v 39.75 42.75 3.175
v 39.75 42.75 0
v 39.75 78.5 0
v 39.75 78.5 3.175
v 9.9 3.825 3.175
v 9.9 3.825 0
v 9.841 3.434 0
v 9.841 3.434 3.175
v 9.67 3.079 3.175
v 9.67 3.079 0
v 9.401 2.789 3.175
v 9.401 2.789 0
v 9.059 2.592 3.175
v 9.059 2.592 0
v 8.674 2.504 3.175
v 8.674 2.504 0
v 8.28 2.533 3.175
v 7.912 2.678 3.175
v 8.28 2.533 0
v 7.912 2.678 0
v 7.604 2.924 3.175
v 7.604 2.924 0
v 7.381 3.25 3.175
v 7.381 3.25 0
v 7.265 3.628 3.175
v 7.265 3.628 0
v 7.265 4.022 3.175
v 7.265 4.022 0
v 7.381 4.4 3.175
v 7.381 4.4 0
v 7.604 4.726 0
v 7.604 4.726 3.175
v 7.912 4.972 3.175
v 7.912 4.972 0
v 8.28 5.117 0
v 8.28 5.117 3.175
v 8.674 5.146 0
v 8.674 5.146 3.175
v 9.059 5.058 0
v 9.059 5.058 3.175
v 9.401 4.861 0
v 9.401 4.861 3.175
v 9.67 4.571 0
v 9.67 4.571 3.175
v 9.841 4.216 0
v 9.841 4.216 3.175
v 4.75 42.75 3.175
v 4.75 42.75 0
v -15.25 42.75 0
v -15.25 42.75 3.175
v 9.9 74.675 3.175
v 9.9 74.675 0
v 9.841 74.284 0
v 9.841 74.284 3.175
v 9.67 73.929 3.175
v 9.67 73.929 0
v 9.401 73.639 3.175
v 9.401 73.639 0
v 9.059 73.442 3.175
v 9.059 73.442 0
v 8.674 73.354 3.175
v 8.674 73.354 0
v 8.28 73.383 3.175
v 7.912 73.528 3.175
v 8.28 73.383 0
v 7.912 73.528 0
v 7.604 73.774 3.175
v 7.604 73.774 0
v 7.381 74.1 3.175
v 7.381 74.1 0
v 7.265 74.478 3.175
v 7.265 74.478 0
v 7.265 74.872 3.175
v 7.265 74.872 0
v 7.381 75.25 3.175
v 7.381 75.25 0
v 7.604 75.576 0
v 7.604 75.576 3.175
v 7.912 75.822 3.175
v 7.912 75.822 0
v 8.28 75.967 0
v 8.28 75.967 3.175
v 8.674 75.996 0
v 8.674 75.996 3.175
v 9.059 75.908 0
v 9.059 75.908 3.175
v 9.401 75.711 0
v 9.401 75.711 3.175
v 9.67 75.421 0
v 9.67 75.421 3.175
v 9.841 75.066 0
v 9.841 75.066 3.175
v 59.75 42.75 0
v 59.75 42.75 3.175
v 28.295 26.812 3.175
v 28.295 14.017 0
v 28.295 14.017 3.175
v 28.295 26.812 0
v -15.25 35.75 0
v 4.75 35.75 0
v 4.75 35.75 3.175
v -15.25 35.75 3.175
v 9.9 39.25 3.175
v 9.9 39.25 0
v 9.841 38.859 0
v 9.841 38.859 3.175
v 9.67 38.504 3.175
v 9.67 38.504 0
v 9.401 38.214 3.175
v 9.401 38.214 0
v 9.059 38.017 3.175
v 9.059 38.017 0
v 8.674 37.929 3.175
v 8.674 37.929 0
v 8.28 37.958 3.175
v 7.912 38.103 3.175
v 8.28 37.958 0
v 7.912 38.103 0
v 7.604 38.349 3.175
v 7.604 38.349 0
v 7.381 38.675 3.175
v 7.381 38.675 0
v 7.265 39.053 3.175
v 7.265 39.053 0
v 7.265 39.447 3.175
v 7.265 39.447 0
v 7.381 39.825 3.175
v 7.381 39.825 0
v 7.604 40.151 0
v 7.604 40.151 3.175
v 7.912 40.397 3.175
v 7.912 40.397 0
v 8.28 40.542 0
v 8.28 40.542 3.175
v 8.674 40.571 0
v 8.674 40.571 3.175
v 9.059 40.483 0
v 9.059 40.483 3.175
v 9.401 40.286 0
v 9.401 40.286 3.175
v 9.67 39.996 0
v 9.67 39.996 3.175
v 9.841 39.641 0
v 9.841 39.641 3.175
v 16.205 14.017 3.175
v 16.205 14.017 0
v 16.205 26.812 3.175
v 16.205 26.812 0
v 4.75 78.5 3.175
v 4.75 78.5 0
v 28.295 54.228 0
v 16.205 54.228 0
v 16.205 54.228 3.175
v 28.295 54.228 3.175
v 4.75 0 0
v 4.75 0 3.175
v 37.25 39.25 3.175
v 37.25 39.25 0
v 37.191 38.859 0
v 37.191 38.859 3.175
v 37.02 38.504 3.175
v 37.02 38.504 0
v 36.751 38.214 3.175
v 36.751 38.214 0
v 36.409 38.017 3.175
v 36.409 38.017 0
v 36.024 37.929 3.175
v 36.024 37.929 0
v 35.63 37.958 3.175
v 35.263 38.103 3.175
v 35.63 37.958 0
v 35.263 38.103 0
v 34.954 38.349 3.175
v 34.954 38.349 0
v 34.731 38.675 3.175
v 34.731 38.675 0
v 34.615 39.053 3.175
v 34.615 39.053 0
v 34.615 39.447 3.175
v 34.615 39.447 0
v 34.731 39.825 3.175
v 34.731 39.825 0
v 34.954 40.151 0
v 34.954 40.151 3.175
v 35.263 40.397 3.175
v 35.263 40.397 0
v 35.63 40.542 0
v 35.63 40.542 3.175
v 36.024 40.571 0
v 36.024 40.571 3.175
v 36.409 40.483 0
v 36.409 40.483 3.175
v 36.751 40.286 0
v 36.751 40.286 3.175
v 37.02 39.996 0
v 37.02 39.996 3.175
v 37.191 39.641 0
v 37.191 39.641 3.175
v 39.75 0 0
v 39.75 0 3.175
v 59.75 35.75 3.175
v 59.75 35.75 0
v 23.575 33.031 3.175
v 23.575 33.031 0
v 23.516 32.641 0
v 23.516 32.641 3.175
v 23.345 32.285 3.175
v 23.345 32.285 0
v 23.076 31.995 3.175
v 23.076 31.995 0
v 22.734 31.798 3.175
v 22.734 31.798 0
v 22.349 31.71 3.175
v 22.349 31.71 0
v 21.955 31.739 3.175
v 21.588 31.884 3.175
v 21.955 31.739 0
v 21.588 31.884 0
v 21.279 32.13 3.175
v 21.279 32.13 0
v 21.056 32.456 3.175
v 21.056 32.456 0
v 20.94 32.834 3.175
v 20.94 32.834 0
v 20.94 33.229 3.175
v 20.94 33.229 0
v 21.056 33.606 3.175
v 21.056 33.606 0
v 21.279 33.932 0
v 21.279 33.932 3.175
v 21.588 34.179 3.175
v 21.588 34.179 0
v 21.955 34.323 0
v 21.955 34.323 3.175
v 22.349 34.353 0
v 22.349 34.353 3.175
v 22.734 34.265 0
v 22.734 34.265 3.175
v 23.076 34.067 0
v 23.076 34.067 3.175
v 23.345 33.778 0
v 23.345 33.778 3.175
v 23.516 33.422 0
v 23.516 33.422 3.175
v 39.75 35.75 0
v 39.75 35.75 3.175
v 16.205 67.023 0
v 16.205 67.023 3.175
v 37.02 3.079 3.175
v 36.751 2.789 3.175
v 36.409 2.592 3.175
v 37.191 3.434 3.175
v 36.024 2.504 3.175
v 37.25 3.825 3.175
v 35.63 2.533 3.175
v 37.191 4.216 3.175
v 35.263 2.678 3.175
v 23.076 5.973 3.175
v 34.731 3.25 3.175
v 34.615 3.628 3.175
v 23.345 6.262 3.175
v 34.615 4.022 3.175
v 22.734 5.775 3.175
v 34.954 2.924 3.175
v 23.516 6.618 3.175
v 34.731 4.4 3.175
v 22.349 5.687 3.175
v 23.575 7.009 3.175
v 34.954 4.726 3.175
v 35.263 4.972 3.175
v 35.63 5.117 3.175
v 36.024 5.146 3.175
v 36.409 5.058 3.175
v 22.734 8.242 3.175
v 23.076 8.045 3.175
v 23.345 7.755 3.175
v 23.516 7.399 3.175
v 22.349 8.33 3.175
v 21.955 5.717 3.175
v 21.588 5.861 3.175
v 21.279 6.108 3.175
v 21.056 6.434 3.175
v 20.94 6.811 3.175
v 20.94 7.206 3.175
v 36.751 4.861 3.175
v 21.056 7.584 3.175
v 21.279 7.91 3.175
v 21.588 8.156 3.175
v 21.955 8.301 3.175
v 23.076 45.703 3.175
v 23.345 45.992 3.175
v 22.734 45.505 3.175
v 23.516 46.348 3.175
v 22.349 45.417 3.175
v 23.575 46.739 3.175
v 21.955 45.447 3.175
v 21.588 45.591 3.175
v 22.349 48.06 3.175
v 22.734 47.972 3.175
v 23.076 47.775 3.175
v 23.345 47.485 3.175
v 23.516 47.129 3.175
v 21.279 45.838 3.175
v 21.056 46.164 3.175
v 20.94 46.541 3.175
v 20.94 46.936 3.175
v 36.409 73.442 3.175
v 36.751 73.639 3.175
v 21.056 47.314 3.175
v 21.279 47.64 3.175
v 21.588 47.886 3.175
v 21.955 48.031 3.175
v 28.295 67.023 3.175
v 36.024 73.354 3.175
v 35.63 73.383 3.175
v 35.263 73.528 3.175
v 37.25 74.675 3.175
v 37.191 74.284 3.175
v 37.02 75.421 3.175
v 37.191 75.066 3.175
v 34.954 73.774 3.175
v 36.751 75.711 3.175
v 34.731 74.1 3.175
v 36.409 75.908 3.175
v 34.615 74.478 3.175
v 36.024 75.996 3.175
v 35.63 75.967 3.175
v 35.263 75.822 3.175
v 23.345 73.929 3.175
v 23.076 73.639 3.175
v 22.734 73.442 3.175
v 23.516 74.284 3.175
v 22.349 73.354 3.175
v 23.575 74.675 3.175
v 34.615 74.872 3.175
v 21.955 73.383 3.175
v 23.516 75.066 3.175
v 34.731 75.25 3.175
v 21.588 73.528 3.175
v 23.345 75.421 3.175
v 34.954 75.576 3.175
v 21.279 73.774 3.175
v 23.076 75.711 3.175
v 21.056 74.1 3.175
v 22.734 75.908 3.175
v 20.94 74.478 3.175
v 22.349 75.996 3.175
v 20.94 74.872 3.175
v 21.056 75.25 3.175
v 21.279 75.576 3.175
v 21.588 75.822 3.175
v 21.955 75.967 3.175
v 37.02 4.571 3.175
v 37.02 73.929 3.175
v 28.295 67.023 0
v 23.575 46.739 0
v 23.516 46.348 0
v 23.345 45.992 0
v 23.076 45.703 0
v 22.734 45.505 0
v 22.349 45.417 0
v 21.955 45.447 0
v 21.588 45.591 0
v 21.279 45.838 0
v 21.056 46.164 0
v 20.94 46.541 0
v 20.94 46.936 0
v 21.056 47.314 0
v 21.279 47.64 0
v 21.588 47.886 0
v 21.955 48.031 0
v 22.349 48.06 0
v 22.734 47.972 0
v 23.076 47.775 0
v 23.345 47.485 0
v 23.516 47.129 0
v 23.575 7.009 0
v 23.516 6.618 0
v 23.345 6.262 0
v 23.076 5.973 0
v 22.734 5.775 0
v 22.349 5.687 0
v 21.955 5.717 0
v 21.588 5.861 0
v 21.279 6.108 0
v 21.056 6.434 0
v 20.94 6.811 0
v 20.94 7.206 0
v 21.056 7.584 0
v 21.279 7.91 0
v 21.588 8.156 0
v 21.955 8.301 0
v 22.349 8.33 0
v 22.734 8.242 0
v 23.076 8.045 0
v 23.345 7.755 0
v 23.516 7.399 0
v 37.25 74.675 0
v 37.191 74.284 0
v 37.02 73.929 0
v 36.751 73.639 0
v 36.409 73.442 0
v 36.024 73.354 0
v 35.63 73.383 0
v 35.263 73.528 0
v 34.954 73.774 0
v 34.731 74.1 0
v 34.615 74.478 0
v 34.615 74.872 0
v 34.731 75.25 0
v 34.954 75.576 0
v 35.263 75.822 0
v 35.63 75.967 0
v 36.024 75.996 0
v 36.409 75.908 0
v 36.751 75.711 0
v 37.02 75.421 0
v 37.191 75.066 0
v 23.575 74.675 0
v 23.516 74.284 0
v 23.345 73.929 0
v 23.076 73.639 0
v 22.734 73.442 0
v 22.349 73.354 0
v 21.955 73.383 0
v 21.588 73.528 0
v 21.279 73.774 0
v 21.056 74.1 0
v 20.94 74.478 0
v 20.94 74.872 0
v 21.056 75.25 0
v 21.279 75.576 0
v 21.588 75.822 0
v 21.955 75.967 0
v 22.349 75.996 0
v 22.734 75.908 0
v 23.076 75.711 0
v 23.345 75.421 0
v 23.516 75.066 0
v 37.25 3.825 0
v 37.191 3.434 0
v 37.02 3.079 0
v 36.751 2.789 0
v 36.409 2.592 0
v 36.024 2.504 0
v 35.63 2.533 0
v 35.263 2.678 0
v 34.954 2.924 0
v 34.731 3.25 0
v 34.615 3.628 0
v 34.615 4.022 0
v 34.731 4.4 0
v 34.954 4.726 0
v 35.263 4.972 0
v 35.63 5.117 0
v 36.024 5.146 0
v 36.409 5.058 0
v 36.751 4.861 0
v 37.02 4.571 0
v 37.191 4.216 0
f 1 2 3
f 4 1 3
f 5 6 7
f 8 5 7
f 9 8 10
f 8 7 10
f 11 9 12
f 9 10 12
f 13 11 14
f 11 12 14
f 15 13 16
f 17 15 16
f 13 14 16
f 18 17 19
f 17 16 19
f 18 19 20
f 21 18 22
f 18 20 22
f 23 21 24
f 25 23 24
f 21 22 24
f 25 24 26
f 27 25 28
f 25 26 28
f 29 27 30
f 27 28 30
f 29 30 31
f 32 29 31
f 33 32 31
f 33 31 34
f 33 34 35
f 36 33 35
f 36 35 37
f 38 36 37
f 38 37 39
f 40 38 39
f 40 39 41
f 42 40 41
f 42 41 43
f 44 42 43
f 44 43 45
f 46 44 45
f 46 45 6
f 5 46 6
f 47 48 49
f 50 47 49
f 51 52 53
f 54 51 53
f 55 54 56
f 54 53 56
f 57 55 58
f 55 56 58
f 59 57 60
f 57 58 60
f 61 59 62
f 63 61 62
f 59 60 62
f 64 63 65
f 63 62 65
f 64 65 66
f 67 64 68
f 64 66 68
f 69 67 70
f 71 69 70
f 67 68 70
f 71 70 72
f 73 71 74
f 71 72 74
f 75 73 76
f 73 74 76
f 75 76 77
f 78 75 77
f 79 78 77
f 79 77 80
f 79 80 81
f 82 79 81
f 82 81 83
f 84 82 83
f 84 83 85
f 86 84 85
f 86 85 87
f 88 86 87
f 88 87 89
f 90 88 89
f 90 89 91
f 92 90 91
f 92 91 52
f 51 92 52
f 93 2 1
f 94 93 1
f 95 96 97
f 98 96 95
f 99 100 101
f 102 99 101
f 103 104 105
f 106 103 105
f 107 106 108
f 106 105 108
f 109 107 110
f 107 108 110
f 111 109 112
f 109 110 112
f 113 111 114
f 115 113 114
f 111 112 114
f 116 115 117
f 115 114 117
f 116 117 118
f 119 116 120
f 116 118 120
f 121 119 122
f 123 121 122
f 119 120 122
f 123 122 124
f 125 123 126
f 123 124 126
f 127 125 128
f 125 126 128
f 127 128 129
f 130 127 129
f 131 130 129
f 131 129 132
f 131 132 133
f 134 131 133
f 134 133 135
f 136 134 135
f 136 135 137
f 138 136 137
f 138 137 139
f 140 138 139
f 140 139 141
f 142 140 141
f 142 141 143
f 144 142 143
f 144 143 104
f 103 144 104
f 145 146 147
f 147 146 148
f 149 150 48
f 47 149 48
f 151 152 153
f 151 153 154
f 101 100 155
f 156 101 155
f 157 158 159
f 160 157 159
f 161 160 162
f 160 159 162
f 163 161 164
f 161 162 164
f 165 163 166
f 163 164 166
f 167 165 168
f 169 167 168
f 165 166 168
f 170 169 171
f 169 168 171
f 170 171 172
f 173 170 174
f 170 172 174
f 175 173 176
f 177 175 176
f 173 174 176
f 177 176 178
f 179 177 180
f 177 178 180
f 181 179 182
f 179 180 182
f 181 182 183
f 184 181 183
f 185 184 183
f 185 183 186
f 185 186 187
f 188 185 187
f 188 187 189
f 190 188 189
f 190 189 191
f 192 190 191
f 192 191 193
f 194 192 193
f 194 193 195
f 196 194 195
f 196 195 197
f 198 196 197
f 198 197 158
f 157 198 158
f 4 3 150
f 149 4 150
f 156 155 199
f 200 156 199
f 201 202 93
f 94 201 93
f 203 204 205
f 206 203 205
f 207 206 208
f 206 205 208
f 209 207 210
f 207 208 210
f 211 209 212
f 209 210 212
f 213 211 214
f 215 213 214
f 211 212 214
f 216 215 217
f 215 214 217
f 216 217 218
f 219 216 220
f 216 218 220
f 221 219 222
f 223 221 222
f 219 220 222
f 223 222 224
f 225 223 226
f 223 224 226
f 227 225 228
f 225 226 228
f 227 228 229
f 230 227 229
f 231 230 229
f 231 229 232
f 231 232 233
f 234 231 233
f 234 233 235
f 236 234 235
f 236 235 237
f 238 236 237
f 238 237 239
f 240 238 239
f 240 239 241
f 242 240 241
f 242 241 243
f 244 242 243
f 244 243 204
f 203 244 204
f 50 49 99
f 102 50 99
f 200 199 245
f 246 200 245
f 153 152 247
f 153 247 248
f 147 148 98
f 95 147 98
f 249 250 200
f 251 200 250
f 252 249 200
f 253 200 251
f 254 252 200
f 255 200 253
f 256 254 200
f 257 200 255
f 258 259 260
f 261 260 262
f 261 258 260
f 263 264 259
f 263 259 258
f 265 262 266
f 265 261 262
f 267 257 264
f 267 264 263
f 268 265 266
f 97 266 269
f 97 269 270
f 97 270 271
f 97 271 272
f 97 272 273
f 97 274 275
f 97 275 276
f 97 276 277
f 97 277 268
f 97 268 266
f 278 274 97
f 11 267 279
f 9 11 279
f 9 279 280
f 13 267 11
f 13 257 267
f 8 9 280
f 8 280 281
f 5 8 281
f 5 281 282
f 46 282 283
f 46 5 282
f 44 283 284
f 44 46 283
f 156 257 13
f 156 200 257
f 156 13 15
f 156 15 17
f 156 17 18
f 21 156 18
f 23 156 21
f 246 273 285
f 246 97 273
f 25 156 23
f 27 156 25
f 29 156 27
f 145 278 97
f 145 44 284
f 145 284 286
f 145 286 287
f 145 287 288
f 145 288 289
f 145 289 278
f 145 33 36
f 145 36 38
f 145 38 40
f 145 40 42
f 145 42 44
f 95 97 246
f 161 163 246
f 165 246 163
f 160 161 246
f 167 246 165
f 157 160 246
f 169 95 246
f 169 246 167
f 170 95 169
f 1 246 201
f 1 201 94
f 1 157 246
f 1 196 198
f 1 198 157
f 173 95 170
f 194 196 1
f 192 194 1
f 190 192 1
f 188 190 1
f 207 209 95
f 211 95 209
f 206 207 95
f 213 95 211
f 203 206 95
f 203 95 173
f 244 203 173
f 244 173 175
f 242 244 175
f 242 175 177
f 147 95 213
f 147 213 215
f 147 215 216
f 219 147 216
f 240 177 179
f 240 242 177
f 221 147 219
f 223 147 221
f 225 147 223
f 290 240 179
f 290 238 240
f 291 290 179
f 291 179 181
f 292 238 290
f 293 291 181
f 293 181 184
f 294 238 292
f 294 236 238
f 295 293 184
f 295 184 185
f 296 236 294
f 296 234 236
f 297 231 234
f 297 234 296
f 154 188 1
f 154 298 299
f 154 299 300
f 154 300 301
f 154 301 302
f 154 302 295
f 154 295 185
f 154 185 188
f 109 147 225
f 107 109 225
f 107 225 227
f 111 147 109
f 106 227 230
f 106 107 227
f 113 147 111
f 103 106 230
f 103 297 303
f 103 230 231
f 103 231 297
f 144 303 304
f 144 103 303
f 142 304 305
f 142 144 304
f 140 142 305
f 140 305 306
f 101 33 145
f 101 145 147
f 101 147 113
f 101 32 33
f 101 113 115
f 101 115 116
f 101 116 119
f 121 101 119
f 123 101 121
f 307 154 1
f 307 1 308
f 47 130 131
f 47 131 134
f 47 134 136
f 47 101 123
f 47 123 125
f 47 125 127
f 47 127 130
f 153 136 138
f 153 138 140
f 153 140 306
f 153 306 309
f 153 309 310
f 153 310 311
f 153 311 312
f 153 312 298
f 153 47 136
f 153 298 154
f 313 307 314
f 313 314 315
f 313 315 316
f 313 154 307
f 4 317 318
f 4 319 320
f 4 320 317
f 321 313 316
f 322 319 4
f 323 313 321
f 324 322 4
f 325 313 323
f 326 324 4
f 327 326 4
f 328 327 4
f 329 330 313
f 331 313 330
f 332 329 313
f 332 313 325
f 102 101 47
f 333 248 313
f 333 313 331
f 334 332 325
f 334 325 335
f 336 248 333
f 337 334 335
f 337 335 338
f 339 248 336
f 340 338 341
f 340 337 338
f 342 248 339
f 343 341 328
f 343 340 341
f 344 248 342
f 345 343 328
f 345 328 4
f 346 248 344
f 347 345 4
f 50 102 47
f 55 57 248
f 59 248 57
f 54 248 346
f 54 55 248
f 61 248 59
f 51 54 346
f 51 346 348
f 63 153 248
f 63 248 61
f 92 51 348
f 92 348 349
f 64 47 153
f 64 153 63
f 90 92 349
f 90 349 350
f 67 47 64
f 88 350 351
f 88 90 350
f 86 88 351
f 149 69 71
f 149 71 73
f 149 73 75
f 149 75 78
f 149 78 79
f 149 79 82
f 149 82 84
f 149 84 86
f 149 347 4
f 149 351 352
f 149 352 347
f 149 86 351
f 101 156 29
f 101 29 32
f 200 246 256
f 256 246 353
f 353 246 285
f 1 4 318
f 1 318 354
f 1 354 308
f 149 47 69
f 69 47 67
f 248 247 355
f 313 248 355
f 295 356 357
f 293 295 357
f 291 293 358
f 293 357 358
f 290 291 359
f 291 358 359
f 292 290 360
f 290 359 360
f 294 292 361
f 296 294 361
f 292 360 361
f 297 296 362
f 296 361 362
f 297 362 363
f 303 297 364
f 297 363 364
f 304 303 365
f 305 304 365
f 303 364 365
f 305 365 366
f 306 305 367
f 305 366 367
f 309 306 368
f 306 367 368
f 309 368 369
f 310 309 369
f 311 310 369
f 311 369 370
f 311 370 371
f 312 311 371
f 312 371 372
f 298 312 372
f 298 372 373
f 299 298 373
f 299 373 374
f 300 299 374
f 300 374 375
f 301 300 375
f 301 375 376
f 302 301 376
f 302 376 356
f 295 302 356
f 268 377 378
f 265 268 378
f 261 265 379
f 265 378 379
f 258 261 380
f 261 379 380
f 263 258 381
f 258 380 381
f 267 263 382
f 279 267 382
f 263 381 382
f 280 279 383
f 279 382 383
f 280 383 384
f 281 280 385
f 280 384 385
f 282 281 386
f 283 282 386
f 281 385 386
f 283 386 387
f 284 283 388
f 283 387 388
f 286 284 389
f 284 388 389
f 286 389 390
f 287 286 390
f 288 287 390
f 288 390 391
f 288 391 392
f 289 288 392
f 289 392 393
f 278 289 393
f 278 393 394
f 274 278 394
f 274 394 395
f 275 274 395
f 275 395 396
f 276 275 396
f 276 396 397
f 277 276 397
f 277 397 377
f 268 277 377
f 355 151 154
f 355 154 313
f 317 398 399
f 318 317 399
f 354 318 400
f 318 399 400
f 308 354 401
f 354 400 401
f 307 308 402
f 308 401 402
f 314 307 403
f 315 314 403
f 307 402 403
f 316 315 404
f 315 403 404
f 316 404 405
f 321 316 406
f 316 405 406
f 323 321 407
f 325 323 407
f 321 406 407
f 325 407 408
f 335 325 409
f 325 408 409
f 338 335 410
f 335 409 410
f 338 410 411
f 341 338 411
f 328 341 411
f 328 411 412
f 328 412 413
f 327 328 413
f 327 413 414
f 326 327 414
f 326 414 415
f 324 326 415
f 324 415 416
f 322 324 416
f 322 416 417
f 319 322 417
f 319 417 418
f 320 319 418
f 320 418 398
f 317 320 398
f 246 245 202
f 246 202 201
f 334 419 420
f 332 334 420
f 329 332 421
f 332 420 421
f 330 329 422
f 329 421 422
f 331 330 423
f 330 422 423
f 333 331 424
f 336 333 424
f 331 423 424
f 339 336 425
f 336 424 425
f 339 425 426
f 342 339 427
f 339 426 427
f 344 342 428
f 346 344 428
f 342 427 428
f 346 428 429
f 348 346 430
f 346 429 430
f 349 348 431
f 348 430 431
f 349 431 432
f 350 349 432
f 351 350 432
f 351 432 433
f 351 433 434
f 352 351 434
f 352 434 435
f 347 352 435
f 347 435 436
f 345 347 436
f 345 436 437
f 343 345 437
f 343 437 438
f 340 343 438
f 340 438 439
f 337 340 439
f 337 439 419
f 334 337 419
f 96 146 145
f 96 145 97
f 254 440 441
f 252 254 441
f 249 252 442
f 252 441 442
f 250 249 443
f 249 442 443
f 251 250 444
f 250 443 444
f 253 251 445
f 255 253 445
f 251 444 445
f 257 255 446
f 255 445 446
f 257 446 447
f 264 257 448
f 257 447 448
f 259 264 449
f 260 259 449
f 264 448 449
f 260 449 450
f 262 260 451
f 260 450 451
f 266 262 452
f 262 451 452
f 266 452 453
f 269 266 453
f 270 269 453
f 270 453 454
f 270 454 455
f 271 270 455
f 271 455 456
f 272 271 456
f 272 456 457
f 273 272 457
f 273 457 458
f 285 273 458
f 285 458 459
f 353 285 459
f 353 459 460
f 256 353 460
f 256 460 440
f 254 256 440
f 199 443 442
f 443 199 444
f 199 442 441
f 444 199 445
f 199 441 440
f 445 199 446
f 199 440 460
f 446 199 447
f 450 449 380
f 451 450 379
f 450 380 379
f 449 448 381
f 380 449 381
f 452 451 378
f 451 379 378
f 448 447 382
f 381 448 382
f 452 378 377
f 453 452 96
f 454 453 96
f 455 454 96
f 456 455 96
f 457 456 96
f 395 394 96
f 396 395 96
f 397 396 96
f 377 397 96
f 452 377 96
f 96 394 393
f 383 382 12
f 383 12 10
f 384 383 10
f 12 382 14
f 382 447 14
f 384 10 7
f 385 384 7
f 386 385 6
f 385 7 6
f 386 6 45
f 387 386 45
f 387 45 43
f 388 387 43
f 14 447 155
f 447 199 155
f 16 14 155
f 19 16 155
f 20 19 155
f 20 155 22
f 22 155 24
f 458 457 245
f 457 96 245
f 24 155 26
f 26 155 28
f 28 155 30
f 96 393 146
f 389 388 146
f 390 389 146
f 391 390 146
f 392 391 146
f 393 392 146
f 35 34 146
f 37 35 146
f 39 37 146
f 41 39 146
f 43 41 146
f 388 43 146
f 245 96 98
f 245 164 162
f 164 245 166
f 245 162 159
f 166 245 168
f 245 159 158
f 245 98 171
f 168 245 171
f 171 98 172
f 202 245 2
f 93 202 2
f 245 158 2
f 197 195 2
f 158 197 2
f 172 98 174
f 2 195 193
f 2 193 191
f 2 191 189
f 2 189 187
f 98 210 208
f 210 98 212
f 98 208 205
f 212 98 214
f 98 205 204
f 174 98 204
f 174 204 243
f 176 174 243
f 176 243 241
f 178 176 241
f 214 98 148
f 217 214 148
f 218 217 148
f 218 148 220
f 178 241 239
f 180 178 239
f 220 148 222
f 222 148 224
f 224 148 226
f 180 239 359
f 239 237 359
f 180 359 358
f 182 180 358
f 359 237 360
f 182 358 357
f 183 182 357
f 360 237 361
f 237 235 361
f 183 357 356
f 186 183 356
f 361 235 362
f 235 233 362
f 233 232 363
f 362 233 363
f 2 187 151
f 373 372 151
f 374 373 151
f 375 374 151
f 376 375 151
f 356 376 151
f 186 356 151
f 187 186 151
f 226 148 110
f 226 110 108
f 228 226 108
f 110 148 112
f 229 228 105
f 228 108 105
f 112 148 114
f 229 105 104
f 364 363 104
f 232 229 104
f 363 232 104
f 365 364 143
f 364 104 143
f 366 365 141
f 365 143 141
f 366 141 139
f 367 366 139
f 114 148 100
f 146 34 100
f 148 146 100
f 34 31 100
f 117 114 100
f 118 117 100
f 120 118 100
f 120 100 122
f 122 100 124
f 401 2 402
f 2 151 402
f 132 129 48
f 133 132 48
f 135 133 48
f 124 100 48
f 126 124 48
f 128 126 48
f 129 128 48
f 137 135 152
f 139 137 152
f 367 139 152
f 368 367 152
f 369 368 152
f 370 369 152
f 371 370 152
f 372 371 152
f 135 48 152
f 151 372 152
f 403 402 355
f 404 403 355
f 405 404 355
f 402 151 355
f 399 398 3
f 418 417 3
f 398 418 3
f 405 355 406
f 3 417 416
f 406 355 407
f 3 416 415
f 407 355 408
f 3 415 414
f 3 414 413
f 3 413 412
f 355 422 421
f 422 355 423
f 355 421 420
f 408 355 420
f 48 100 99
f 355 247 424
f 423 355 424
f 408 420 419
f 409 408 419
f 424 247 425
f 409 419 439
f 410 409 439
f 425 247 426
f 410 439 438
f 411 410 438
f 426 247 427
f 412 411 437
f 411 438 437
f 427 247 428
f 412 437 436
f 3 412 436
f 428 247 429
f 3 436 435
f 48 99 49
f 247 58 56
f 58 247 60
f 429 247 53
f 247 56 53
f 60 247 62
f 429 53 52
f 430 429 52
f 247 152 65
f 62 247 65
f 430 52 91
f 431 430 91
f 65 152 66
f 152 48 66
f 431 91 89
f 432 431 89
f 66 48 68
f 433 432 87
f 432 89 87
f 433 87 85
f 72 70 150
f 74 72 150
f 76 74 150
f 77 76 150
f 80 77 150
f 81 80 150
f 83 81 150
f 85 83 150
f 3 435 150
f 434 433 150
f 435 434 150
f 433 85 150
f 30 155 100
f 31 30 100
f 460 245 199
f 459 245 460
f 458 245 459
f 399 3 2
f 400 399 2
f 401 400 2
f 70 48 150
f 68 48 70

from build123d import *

# Parameters (mm, degrees)
F0_W      = 22.25
F0_H      = 17.875
F1_DEPTH  = 3.175
F2_DEPTH  = 5.08
F3_DEPTH  = 2.54
F4_DEPTH  = 5.08
F5_DEPTH  = 5.08
F6_DEPTH  = 5.08
F7_DEPTH  = 4.7498
F8_DEPTH  = 4.7498
F9_DEPTH  = 4.7498
F10_DEPTH = 4.7498
F11_DEPTH = 2.54
F12_R     = 1.325
F13_DEPTH = 25.4
F14_DEPTH = 25.4
F15_DEPTH = 25.4
F16_DEPTH = 25.4


# Not quite as in the source:
# - a feature names something its author has since deleted; it is built from what else it names


with BuildPart() as f1:
    # F0 (on Top) → F1 (new body)
    with BuildSketch(Plane.XY):
        Polygon((0, 35.75), (0, 0), (44.5, 0), (44.5, 35.75), (64.5, 35.75), (64.5, 39.25), (64.5, 42.75), (44.5, 42.75), (44.5, 78.5), (0, 78.5), (0, 42.75), (-20, 42.75), (-20, 39.25), (-20, 35.75), align=None)
        with Locations((22.25, 17.875)):
            Rectangle(F0_W, F0_H, mode=Mode.SUBTRACT)
        with Locations((22.25, 60.625)):
            Rectangle(F0_W, F0_H, mode=Mode.SUBTRACT)
    extrude(amount=F1_DEPTH)

    # F2 (add): a face of the model
    f2_faces = [f1.faces().sort_by_distance(p)[0] for p in [
        (22.25, 69.5625, 1.5875),
    ]]
    extrude(f2_faces, amount=F2_DEPTH)

    # F3 (add): faces of the model
    f3_faces = [f1.faces().sort_by_distance(p)[0] for p in [
        (22.25, 51.6875, 1.5875),
        (22.25, 26.8125, 1.5875),
    ]]
    extrude(f3_faces, amount=F3_DEPTH, dir=(0, 1, 0))

    # F4 (add): a face of the model
    f4_faces = [f1.faces().sort_by_distance(p)[0] for p in [
        (22.25, 8.9375, 1.5875),
    ]]
    extrude(f4_faces, amount=F4_DEPTH)

    # F5 (add): faces of the model
    f5_faces = [f1.faces().sort_by_distance(p)[0] for p in [
        (33.375, 59.355, 1.5875),
        (33.375, 20.415, 1.5875),
    ]]
    extrude(f5_faces, amount=F5_DEPTH)

    # F6 (add): faces of the model
    f6_faces = [f1.faces().sort_by_distance(p)[0] for p in [
        (11.125, 59.355, 1.5875),
        (11.125, 20.415, 1.5875),
    ]]
    extrude(f6_faces, amount=F6_DEPTH)

    # F7 (cut): faces of the model
    f7_faces = [f1.faces().sort_by_distance(p)[0] for p in [
        (44.5, 60.625, 1.5875),
        (44.5, 17.875, 1.5875),
    ]]
    extrude(f7_faces, amount=-F7_DEPTH, mode=Mode.SUBTRACT)

    # F8 (cut): faces of the model
    f8_faces = [f1.faces().sort_by_distance(p)[0] for p in [
        (0, 60.625, 1.5875),
        (0, 17.875, 1.5875),
    ]]
    extrude(f8_faces, amount=-F8_DEPTH, mode=Mode.SUBTRACT)

    # F9 (cut): a face of the model
    f9_faces = [f1.faces().sort_by_distance(p)[0] for p in [
        (-20, 39.25, 1.5875),
    ]]
    extrude(f9_faces, amount=-F9_DEPTH, mode=Mode.SUBTRACT)

    # F10 (cut): a face of the model
    f10_faces = [f1.faces().sort_by_distance(p)[0] for p in [
        (64.5, 39.25, 1.5875),
    ]]
    extrude(f10_faces, amount=-F10_DEPTH, mode=Mode.SUBTRACT)

    # F11 (cut): a face of the model
    f11_faces = [f1.faces().sort_by_distance(p)[0] for p in [
        (22.25, 64.4825, 1.5875),
    ]]
    extrude(f11_faces, amount=-F11_DEPTH, mode=Mode.SUBTRACT)

    # F12 (on face) → F13 (cut)
    with BuildSketch(Plane(origin=(0, 0, 0), x_dir=(1, 0, 0), z_dir=(0, 0, -1))):
        with BuildLine():
            ThreePointArc((34.6002, -74.675), (35.9252, -76), (37.2502, -74.675))
            ThreePointArc((37.2502, -74.675), (35.9252, -73.35), (34.6002, -74.675))
        make_face()
        with Locations((8.5748, -74.675)):
            Circle(F12_R)
        with Locations((8.5748, -39.25)):
            Circle(F12_R)
        with BuildLine():
            ThreePointArc((34.6002, -39.25), (35.9252, -40.575), (37.2502, -39.25))
            ThreePointArc((37.2502, -39.25), (35.9252, -37.925), (34.6002, -39.25))
        make_face()
        with Locations((35.9252, -3.825)):
            Circle(F12_R)
        with Locations((8.5748, -3.825)):
            Circle(F12_R)
    extrude(amount=-F13_DEPTH, mode=Mode.SUBTRACT)

    # F12 (on face) → F14 (cut)
    with BuildSketch(Plane(origin=(0, 0, 0), x_dir=(1, 0, 0), z_dir=(0, 0, -1))):
        with Locations((22.25, -74.675)):
            Circle(F12_R)
    extrude(amount=-F14_DEPTH, mode=Mode.SUBTRACT)

    # F12 (on face) → F15 (cut)
    with BuildSketch(Plane(origin=(0, 0, 0), x_dir=(1, 0, 0), z_dir=(0, 0, -1))):
        with Locations((22.25, -7.00875)):
            Circle(F12_R)
        with Locations((22.25, -46.73875)):
            Circle(F12_R)
    extrude(amount=-F15_DEPTH, mode=Mode.SUBTRACT)

    # F12 (on face) → F16 (cut)
    with BuildSketch(Plane(origin=(0, 0, 0), x_dir=(1, 0, 0), z_dir=(0, 0, -1))):
        with Locations((22.25, -33.03125)):
            Circle(F12_R)
    extrude(amount=-F16_DEPTH, mode=Mode.SUBTRACT)


solid = f1.part
